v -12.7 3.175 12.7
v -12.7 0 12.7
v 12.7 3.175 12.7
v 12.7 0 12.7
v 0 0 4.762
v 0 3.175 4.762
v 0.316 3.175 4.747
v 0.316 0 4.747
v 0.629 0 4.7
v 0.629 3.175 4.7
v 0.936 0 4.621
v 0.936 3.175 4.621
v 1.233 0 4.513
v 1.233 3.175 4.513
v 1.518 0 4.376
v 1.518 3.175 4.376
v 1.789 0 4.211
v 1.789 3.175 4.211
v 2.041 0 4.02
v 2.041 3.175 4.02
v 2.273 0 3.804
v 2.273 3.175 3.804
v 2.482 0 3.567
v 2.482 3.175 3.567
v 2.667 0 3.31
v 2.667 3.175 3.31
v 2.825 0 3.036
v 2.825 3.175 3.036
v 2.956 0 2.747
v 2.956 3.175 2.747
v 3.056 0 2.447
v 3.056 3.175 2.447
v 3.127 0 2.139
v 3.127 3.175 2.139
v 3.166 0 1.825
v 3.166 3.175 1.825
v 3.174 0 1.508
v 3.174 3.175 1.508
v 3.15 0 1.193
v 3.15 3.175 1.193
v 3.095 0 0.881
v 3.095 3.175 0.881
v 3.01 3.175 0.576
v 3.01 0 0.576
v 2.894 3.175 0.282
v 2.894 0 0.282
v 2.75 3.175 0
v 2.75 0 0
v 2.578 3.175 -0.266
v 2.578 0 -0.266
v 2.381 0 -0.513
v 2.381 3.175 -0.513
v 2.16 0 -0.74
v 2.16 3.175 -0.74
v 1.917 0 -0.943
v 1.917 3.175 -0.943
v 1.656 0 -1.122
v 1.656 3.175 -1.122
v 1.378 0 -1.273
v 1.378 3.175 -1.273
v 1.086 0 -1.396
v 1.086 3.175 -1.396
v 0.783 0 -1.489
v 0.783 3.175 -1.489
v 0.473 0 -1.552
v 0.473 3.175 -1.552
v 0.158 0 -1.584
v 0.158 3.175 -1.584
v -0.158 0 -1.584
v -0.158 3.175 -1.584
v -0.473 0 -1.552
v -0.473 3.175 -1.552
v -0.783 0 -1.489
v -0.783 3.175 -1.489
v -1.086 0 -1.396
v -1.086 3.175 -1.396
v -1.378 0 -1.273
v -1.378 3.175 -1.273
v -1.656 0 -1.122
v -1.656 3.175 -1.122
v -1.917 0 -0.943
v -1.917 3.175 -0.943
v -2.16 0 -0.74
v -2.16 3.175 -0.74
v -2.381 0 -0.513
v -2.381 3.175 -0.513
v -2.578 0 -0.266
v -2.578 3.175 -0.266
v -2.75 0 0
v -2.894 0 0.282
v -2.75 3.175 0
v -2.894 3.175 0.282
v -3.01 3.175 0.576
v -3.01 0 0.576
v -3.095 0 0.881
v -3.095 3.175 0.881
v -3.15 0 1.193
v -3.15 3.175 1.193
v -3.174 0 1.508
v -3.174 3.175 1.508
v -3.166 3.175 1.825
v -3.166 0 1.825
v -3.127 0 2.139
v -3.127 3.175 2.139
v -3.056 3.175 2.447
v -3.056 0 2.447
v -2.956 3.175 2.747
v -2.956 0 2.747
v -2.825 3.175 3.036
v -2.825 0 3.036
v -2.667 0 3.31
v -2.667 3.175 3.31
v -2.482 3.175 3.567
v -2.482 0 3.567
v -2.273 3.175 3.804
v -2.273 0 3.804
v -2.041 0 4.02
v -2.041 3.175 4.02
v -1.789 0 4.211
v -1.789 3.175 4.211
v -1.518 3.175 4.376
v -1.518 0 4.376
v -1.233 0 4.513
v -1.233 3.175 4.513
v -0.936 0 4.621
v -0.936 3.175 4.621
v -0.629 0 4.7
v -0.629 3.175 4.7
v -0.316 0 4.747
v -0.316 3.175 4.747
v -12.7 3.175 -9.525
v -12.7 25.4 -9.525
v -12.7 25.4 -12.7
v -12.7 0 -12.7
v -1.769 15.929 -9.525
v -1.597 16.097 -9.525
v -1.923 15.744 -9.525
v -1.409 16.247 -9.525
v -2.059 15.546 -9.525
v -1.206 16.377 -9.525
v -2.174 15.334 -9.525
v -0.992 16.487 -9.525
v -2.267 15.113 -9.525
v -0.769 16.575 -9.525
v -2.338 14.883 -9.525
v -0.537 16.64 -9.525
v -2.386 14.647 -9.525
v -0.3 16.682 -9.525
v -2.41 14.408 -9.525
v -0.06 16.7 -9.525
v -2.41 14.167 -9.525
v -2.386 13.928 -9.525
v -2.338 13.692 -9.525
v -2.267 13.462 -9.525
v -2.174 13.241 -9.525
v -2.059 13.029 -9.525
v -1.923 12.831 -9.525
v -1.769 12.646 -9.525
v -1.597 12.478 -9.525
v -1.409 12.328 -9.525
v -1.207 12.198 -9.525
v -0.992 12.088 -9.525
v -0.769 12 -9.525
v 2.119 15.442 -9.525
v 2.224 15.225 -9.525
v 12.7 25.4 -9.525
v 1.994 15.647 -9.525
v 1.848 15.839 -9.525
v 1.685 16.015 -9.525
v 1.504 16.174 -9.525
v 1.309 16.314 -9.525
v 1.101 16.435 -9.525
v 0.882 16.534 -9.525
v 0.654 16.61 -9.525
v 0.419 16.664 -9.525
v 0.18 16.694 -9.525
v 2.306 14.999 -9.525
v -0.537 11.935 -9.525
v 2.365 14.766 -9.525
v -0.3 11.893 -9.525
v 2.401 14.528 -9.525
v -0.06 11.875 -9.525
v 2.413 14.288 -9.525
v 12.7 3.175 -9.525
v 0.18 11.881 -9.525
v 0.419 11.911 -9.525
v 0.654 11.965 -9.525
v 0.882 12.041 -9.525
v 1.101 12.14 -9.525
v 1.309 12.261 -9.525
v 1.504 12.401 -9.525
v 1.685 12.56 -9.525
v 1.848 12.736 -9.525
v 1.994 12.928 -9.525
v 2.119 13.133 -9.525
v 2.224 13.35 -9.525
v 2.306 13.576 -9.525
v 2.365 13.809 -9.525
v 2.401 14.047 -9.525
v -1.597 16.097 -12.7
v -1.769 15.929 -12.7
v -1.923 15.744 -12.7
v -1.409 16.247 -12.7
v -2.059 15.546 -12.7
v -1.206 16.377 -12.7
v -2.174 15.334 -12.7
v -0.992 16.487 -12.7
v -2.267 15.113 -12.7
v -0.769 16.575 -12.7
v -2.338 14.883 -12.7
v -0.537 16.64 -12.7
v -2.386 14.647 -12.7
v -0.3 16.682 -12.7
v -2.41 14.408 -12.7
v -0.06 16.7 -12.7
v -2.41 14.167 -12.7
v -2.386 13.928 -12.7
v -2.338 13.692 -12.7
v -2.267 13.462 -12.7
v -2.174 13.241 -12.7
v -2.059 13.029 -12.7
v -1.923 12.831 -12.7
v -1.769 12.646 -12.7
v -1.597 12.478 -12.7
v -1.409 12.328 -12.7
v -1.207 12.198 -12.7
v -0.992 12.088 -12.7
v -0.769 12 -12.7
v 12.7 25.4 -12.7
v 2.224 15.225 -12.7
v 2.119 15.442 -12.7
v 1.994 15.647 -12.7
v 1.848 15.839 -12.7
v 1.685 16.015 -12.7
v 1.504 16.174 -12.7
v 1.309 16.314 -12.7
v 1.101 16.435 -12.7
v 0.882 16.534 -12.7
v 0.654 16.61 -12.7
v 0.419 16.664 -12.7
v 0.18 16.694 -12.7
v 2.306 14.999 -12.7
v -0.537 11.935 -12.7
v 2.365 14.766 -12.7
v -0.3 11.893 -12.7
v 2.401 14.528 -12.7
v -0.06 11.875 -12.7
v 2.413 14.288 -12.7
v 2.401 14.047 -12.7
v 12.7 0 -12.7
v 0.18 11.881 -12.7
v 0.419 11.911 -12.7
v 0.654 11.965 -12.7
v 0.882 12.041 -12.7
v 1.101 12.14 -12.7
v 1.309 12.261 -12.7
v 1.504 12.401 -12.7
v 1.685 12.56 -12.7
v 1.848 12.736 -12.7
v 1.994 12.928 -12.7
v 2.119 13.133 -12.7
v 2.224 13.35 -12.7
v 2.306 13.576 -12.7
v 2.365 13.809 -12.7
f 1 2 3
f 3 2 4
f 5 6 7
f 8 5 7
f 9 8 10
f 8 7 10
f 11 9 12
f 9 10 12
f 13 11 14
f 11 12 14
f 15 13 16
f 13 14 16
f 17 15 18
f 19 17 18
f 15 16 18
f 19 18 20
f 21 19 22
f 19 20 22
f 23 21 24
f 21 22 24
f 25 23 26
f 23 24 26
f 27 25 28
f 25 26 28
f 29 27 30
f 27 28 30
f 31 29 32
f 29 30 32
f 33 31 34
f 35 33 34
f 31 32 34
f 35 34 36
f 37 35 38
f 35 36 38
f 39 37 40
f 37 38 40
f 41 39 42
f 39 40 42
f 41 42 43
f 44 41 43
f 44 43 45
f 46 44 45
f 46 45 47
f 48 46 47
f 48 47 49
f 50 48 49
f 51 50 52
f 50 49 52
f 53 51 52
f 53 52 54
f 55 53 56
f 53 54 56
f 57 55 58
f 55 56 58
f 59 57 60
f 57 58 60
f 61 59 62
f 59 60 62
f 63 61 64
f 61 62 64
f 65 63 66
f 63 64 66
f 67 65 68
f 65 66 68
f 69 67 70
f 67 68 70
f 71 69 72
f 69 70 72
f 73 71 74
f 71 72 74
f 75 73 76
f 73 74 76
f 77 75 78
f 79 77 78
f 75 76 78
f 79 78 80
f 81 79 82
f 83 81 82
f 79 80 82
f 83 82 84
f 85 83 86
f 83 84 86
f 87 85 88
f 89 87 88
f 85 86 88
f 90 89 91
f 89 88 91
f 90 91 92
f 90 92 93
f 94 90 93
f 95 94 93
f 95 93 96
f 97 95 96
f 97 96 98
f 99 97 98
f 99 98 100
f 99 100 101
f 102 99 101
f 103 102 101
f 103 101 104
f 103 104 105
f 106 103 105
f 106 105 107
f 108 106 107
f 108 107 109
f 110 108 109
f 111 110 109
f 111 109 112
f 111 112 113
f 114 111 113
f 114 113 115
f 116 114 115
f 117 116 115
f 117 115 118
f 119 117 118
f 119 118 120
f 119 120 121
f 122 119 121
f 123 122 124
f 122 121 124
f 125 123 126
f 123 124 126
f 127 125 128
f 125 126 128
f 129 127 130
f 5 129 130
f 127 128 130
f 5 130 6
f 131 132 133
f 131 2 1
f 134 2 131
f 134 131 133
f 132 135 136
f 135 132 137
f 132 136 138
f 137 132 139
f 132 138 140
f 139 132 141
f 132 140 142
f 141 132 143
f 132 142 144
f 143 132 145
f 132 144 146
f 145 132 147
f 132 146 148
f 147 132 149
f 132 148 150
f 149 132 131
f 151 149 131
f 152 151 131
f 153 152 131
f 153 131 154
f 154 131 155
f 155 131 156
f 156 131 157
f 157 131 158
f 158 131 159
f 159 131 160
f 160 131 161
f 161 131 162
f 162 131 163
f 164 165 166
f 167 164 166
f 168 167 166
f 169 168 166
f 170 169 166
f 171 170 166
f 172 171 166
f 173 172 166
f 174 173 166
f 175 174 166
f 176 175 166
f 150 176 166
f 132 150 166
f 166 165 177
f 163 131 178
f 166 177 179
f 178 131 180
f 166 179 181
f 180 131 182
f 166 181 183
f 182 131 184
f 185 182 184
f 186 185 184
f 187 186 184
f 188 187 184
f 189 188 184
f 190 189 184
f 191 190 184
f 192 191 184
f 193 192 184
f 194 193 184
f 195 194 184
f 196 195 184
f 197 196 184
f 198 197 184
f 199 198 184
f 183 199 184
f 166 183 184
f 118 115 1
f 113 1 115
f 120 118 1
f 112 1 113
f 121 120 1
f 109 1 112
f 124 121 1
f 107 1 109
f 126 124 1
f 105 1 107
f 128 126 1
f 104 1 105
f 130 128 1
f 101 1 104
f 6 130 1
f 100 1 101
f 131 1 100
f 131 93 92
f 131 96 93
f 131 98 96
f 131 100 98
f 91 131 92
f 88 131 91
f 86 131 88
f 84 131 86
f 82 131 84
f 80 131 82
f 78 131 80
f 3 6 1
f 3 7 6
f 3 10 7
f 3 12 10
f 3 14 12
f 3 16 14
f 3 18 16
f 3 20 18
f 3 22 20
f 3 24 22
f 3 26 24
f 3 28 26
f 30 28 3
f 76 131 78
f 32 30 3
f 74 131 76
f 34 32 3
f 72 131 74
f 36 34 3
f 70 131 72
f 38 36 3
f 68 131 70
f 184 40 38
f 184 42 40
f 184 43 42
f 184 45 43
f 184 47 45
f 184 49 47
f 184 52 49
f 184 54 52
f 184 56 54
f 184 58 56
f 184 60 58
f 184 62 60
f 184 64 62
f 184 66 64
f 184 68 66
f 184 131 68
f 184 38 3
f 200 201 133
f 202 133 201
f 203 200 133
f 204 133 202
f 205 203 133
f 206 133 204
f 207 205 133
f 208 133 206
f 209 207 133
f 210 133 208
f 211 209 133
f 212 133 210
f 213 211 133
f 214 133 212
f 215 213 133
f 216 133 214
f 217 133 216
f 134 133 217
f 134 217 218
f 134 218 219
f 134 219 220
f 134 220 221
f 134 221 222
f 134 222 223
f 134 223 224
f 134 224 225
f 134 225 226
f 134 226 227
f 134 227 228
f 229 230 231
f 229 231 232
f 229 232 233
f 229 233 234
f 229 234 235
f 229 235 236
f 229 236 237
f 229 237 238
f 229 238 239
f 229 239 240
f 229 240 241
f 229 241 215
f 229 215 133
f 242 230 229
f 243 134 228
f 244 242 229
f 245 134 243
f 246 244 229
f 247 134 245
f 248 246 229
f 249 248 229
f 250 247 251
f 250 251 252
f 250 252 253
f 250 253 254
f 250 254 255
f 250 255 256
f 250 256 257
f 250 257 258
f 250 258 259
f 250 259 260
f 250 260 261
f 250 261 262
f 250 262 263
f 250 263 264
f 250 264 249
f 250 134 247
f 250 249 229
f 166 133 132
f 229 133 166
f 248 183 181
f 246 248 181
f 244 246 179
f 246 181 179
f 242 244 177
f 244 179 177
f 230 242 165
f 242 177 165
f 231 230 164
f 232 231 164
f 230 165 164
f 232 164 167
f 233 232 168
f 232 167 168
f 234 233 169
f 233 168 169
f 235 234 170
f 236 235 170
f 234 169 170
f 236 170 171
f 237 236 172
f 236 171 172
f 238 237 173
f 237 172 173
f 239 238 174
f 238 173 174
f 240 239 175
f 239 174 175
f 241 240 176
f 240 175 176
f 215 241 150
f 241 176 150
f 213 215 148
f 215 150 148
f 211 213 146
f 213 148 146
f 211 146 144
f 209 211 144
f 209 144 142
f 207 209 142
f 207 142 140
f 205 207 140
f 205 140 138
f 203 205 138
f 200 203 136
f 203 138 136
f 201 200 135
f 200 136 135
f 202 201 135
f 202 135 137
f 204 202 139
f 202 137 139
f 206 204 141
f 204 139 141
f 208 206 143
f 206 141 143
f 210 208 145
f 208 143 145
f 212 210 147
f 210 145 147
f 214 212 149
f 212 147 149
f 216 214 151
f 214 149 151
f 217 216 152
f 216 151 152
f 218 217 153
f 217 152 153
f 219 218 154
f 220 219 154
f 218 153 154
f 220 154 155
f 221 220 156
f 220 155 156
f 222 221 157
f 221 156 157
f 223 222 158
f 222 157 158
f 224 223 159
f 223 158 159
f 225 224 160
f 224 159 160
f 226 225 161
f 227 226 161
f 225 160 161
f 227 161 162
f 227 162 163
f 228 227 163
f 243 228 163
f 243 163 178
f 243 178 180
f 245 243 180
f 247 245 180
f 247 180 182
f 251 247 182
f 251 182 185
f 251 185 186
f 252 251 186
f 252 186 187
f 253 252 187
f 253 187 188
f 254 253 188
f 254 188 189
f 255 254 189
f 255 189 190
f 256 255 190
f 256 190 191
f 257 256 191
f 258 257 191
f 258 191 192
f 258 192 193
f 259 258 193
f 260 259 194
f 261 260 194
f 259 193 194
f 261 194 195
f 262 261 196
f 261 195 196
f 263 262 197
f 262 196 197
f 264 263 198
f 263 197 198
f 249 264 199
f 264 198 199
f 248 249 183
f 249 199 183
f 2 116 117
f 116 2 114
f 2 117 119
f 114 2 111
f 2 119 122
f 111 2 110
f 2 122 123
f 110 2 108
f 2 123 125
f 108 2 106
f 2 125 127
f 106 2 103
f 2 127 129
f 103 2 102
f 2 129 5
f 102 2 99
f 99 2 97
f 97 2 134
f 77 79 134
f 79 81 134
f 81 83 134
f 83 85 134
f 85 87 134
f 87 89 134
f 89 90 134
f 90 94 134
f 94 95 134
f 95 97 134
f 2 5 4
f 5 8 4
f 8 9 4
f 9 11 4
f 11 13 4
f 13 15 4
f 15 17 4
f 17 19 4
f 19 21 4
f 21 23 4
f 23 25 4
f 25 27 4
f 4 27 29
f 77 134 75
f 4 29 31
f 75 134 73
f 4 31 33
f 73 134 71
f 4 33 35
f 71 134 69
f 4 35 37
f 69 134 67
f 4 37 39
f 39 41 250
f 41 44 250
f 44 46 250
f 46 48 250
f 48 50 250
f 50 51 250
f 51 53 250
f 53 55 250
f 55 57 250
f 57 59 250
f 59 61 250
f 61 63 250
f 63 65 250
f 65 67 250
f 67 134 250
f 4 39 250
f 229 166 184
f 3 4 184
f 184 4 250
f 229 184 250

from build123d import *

# Parameters (mm, degrees)
SKETCH1_W           = 25.4
SKETCH1_H           = 25.4
BOSS_EXTRUDE1_DEPTH = 3.175
SKETCH6_W           = 25.4
SKETCH6_H           = 3.175
BOSS_EXTRUDE2_DEPTH = 22.225
SKETCH8_R           = 2.413
CUT_EXTRUDE3_DEPTH  = 3.175
SKETCH9_R           = 3.175
CUT_EXTRUDE4_DEPTH  = 3.175


with BuildPart() as part:
    # Sketch1 → Boss-Extrude1 (new body)
    with BuildSketch(Plane(origin=(0, 0, 0), x_dir=(1, 0, 0), z_dir=(0, 1, 0))):
        Rectangle(SKETCH1_W, SKETCH1_H)
    extrude(amount=BOSS_EXTRUDE1_DEPTH)

    # Sketch6 → Boss-Extrude2 (add)
    with BuildSketch(Plane(origin=(0, 3.175, 0), x_dir=(1, 0, 0), z_dir=(0, 1, 0))):
        with Locations((0, 11.1125)):
            Rectangle(SKETCH6_W, SKETCH6_H)
    extrude(amount=BOSS_EXTRUDE2_DEPTH)

    # Sketch8 → Cut-Extrude3 (cut)
    with BuildSketch(Plane.XY.offset(-9.525)):
        with Locations((0, 14.2875)):
            Circle(SKETCH8_R)
    extrude(amount=-CUT_EXTRUDE3_DEPTH, mode=Mode.SUBTRACT)

    # Sketch9 → Cut-Extrude4 (cut)
    with BuildSketch(Plane(origin=(0, 3.175, 0), x_dir=(1, 0, 0), z_dir=(0, 1, 0))):
        with Locations(Location((0, -1.5875, 0), (0, 0, 270))):
            Circle(SKETCH9_R)
    extrude(amount=-CUT_EXTRUDE4_DEPTH, mode=Mode.SUBTRACT)


solid = part.part
